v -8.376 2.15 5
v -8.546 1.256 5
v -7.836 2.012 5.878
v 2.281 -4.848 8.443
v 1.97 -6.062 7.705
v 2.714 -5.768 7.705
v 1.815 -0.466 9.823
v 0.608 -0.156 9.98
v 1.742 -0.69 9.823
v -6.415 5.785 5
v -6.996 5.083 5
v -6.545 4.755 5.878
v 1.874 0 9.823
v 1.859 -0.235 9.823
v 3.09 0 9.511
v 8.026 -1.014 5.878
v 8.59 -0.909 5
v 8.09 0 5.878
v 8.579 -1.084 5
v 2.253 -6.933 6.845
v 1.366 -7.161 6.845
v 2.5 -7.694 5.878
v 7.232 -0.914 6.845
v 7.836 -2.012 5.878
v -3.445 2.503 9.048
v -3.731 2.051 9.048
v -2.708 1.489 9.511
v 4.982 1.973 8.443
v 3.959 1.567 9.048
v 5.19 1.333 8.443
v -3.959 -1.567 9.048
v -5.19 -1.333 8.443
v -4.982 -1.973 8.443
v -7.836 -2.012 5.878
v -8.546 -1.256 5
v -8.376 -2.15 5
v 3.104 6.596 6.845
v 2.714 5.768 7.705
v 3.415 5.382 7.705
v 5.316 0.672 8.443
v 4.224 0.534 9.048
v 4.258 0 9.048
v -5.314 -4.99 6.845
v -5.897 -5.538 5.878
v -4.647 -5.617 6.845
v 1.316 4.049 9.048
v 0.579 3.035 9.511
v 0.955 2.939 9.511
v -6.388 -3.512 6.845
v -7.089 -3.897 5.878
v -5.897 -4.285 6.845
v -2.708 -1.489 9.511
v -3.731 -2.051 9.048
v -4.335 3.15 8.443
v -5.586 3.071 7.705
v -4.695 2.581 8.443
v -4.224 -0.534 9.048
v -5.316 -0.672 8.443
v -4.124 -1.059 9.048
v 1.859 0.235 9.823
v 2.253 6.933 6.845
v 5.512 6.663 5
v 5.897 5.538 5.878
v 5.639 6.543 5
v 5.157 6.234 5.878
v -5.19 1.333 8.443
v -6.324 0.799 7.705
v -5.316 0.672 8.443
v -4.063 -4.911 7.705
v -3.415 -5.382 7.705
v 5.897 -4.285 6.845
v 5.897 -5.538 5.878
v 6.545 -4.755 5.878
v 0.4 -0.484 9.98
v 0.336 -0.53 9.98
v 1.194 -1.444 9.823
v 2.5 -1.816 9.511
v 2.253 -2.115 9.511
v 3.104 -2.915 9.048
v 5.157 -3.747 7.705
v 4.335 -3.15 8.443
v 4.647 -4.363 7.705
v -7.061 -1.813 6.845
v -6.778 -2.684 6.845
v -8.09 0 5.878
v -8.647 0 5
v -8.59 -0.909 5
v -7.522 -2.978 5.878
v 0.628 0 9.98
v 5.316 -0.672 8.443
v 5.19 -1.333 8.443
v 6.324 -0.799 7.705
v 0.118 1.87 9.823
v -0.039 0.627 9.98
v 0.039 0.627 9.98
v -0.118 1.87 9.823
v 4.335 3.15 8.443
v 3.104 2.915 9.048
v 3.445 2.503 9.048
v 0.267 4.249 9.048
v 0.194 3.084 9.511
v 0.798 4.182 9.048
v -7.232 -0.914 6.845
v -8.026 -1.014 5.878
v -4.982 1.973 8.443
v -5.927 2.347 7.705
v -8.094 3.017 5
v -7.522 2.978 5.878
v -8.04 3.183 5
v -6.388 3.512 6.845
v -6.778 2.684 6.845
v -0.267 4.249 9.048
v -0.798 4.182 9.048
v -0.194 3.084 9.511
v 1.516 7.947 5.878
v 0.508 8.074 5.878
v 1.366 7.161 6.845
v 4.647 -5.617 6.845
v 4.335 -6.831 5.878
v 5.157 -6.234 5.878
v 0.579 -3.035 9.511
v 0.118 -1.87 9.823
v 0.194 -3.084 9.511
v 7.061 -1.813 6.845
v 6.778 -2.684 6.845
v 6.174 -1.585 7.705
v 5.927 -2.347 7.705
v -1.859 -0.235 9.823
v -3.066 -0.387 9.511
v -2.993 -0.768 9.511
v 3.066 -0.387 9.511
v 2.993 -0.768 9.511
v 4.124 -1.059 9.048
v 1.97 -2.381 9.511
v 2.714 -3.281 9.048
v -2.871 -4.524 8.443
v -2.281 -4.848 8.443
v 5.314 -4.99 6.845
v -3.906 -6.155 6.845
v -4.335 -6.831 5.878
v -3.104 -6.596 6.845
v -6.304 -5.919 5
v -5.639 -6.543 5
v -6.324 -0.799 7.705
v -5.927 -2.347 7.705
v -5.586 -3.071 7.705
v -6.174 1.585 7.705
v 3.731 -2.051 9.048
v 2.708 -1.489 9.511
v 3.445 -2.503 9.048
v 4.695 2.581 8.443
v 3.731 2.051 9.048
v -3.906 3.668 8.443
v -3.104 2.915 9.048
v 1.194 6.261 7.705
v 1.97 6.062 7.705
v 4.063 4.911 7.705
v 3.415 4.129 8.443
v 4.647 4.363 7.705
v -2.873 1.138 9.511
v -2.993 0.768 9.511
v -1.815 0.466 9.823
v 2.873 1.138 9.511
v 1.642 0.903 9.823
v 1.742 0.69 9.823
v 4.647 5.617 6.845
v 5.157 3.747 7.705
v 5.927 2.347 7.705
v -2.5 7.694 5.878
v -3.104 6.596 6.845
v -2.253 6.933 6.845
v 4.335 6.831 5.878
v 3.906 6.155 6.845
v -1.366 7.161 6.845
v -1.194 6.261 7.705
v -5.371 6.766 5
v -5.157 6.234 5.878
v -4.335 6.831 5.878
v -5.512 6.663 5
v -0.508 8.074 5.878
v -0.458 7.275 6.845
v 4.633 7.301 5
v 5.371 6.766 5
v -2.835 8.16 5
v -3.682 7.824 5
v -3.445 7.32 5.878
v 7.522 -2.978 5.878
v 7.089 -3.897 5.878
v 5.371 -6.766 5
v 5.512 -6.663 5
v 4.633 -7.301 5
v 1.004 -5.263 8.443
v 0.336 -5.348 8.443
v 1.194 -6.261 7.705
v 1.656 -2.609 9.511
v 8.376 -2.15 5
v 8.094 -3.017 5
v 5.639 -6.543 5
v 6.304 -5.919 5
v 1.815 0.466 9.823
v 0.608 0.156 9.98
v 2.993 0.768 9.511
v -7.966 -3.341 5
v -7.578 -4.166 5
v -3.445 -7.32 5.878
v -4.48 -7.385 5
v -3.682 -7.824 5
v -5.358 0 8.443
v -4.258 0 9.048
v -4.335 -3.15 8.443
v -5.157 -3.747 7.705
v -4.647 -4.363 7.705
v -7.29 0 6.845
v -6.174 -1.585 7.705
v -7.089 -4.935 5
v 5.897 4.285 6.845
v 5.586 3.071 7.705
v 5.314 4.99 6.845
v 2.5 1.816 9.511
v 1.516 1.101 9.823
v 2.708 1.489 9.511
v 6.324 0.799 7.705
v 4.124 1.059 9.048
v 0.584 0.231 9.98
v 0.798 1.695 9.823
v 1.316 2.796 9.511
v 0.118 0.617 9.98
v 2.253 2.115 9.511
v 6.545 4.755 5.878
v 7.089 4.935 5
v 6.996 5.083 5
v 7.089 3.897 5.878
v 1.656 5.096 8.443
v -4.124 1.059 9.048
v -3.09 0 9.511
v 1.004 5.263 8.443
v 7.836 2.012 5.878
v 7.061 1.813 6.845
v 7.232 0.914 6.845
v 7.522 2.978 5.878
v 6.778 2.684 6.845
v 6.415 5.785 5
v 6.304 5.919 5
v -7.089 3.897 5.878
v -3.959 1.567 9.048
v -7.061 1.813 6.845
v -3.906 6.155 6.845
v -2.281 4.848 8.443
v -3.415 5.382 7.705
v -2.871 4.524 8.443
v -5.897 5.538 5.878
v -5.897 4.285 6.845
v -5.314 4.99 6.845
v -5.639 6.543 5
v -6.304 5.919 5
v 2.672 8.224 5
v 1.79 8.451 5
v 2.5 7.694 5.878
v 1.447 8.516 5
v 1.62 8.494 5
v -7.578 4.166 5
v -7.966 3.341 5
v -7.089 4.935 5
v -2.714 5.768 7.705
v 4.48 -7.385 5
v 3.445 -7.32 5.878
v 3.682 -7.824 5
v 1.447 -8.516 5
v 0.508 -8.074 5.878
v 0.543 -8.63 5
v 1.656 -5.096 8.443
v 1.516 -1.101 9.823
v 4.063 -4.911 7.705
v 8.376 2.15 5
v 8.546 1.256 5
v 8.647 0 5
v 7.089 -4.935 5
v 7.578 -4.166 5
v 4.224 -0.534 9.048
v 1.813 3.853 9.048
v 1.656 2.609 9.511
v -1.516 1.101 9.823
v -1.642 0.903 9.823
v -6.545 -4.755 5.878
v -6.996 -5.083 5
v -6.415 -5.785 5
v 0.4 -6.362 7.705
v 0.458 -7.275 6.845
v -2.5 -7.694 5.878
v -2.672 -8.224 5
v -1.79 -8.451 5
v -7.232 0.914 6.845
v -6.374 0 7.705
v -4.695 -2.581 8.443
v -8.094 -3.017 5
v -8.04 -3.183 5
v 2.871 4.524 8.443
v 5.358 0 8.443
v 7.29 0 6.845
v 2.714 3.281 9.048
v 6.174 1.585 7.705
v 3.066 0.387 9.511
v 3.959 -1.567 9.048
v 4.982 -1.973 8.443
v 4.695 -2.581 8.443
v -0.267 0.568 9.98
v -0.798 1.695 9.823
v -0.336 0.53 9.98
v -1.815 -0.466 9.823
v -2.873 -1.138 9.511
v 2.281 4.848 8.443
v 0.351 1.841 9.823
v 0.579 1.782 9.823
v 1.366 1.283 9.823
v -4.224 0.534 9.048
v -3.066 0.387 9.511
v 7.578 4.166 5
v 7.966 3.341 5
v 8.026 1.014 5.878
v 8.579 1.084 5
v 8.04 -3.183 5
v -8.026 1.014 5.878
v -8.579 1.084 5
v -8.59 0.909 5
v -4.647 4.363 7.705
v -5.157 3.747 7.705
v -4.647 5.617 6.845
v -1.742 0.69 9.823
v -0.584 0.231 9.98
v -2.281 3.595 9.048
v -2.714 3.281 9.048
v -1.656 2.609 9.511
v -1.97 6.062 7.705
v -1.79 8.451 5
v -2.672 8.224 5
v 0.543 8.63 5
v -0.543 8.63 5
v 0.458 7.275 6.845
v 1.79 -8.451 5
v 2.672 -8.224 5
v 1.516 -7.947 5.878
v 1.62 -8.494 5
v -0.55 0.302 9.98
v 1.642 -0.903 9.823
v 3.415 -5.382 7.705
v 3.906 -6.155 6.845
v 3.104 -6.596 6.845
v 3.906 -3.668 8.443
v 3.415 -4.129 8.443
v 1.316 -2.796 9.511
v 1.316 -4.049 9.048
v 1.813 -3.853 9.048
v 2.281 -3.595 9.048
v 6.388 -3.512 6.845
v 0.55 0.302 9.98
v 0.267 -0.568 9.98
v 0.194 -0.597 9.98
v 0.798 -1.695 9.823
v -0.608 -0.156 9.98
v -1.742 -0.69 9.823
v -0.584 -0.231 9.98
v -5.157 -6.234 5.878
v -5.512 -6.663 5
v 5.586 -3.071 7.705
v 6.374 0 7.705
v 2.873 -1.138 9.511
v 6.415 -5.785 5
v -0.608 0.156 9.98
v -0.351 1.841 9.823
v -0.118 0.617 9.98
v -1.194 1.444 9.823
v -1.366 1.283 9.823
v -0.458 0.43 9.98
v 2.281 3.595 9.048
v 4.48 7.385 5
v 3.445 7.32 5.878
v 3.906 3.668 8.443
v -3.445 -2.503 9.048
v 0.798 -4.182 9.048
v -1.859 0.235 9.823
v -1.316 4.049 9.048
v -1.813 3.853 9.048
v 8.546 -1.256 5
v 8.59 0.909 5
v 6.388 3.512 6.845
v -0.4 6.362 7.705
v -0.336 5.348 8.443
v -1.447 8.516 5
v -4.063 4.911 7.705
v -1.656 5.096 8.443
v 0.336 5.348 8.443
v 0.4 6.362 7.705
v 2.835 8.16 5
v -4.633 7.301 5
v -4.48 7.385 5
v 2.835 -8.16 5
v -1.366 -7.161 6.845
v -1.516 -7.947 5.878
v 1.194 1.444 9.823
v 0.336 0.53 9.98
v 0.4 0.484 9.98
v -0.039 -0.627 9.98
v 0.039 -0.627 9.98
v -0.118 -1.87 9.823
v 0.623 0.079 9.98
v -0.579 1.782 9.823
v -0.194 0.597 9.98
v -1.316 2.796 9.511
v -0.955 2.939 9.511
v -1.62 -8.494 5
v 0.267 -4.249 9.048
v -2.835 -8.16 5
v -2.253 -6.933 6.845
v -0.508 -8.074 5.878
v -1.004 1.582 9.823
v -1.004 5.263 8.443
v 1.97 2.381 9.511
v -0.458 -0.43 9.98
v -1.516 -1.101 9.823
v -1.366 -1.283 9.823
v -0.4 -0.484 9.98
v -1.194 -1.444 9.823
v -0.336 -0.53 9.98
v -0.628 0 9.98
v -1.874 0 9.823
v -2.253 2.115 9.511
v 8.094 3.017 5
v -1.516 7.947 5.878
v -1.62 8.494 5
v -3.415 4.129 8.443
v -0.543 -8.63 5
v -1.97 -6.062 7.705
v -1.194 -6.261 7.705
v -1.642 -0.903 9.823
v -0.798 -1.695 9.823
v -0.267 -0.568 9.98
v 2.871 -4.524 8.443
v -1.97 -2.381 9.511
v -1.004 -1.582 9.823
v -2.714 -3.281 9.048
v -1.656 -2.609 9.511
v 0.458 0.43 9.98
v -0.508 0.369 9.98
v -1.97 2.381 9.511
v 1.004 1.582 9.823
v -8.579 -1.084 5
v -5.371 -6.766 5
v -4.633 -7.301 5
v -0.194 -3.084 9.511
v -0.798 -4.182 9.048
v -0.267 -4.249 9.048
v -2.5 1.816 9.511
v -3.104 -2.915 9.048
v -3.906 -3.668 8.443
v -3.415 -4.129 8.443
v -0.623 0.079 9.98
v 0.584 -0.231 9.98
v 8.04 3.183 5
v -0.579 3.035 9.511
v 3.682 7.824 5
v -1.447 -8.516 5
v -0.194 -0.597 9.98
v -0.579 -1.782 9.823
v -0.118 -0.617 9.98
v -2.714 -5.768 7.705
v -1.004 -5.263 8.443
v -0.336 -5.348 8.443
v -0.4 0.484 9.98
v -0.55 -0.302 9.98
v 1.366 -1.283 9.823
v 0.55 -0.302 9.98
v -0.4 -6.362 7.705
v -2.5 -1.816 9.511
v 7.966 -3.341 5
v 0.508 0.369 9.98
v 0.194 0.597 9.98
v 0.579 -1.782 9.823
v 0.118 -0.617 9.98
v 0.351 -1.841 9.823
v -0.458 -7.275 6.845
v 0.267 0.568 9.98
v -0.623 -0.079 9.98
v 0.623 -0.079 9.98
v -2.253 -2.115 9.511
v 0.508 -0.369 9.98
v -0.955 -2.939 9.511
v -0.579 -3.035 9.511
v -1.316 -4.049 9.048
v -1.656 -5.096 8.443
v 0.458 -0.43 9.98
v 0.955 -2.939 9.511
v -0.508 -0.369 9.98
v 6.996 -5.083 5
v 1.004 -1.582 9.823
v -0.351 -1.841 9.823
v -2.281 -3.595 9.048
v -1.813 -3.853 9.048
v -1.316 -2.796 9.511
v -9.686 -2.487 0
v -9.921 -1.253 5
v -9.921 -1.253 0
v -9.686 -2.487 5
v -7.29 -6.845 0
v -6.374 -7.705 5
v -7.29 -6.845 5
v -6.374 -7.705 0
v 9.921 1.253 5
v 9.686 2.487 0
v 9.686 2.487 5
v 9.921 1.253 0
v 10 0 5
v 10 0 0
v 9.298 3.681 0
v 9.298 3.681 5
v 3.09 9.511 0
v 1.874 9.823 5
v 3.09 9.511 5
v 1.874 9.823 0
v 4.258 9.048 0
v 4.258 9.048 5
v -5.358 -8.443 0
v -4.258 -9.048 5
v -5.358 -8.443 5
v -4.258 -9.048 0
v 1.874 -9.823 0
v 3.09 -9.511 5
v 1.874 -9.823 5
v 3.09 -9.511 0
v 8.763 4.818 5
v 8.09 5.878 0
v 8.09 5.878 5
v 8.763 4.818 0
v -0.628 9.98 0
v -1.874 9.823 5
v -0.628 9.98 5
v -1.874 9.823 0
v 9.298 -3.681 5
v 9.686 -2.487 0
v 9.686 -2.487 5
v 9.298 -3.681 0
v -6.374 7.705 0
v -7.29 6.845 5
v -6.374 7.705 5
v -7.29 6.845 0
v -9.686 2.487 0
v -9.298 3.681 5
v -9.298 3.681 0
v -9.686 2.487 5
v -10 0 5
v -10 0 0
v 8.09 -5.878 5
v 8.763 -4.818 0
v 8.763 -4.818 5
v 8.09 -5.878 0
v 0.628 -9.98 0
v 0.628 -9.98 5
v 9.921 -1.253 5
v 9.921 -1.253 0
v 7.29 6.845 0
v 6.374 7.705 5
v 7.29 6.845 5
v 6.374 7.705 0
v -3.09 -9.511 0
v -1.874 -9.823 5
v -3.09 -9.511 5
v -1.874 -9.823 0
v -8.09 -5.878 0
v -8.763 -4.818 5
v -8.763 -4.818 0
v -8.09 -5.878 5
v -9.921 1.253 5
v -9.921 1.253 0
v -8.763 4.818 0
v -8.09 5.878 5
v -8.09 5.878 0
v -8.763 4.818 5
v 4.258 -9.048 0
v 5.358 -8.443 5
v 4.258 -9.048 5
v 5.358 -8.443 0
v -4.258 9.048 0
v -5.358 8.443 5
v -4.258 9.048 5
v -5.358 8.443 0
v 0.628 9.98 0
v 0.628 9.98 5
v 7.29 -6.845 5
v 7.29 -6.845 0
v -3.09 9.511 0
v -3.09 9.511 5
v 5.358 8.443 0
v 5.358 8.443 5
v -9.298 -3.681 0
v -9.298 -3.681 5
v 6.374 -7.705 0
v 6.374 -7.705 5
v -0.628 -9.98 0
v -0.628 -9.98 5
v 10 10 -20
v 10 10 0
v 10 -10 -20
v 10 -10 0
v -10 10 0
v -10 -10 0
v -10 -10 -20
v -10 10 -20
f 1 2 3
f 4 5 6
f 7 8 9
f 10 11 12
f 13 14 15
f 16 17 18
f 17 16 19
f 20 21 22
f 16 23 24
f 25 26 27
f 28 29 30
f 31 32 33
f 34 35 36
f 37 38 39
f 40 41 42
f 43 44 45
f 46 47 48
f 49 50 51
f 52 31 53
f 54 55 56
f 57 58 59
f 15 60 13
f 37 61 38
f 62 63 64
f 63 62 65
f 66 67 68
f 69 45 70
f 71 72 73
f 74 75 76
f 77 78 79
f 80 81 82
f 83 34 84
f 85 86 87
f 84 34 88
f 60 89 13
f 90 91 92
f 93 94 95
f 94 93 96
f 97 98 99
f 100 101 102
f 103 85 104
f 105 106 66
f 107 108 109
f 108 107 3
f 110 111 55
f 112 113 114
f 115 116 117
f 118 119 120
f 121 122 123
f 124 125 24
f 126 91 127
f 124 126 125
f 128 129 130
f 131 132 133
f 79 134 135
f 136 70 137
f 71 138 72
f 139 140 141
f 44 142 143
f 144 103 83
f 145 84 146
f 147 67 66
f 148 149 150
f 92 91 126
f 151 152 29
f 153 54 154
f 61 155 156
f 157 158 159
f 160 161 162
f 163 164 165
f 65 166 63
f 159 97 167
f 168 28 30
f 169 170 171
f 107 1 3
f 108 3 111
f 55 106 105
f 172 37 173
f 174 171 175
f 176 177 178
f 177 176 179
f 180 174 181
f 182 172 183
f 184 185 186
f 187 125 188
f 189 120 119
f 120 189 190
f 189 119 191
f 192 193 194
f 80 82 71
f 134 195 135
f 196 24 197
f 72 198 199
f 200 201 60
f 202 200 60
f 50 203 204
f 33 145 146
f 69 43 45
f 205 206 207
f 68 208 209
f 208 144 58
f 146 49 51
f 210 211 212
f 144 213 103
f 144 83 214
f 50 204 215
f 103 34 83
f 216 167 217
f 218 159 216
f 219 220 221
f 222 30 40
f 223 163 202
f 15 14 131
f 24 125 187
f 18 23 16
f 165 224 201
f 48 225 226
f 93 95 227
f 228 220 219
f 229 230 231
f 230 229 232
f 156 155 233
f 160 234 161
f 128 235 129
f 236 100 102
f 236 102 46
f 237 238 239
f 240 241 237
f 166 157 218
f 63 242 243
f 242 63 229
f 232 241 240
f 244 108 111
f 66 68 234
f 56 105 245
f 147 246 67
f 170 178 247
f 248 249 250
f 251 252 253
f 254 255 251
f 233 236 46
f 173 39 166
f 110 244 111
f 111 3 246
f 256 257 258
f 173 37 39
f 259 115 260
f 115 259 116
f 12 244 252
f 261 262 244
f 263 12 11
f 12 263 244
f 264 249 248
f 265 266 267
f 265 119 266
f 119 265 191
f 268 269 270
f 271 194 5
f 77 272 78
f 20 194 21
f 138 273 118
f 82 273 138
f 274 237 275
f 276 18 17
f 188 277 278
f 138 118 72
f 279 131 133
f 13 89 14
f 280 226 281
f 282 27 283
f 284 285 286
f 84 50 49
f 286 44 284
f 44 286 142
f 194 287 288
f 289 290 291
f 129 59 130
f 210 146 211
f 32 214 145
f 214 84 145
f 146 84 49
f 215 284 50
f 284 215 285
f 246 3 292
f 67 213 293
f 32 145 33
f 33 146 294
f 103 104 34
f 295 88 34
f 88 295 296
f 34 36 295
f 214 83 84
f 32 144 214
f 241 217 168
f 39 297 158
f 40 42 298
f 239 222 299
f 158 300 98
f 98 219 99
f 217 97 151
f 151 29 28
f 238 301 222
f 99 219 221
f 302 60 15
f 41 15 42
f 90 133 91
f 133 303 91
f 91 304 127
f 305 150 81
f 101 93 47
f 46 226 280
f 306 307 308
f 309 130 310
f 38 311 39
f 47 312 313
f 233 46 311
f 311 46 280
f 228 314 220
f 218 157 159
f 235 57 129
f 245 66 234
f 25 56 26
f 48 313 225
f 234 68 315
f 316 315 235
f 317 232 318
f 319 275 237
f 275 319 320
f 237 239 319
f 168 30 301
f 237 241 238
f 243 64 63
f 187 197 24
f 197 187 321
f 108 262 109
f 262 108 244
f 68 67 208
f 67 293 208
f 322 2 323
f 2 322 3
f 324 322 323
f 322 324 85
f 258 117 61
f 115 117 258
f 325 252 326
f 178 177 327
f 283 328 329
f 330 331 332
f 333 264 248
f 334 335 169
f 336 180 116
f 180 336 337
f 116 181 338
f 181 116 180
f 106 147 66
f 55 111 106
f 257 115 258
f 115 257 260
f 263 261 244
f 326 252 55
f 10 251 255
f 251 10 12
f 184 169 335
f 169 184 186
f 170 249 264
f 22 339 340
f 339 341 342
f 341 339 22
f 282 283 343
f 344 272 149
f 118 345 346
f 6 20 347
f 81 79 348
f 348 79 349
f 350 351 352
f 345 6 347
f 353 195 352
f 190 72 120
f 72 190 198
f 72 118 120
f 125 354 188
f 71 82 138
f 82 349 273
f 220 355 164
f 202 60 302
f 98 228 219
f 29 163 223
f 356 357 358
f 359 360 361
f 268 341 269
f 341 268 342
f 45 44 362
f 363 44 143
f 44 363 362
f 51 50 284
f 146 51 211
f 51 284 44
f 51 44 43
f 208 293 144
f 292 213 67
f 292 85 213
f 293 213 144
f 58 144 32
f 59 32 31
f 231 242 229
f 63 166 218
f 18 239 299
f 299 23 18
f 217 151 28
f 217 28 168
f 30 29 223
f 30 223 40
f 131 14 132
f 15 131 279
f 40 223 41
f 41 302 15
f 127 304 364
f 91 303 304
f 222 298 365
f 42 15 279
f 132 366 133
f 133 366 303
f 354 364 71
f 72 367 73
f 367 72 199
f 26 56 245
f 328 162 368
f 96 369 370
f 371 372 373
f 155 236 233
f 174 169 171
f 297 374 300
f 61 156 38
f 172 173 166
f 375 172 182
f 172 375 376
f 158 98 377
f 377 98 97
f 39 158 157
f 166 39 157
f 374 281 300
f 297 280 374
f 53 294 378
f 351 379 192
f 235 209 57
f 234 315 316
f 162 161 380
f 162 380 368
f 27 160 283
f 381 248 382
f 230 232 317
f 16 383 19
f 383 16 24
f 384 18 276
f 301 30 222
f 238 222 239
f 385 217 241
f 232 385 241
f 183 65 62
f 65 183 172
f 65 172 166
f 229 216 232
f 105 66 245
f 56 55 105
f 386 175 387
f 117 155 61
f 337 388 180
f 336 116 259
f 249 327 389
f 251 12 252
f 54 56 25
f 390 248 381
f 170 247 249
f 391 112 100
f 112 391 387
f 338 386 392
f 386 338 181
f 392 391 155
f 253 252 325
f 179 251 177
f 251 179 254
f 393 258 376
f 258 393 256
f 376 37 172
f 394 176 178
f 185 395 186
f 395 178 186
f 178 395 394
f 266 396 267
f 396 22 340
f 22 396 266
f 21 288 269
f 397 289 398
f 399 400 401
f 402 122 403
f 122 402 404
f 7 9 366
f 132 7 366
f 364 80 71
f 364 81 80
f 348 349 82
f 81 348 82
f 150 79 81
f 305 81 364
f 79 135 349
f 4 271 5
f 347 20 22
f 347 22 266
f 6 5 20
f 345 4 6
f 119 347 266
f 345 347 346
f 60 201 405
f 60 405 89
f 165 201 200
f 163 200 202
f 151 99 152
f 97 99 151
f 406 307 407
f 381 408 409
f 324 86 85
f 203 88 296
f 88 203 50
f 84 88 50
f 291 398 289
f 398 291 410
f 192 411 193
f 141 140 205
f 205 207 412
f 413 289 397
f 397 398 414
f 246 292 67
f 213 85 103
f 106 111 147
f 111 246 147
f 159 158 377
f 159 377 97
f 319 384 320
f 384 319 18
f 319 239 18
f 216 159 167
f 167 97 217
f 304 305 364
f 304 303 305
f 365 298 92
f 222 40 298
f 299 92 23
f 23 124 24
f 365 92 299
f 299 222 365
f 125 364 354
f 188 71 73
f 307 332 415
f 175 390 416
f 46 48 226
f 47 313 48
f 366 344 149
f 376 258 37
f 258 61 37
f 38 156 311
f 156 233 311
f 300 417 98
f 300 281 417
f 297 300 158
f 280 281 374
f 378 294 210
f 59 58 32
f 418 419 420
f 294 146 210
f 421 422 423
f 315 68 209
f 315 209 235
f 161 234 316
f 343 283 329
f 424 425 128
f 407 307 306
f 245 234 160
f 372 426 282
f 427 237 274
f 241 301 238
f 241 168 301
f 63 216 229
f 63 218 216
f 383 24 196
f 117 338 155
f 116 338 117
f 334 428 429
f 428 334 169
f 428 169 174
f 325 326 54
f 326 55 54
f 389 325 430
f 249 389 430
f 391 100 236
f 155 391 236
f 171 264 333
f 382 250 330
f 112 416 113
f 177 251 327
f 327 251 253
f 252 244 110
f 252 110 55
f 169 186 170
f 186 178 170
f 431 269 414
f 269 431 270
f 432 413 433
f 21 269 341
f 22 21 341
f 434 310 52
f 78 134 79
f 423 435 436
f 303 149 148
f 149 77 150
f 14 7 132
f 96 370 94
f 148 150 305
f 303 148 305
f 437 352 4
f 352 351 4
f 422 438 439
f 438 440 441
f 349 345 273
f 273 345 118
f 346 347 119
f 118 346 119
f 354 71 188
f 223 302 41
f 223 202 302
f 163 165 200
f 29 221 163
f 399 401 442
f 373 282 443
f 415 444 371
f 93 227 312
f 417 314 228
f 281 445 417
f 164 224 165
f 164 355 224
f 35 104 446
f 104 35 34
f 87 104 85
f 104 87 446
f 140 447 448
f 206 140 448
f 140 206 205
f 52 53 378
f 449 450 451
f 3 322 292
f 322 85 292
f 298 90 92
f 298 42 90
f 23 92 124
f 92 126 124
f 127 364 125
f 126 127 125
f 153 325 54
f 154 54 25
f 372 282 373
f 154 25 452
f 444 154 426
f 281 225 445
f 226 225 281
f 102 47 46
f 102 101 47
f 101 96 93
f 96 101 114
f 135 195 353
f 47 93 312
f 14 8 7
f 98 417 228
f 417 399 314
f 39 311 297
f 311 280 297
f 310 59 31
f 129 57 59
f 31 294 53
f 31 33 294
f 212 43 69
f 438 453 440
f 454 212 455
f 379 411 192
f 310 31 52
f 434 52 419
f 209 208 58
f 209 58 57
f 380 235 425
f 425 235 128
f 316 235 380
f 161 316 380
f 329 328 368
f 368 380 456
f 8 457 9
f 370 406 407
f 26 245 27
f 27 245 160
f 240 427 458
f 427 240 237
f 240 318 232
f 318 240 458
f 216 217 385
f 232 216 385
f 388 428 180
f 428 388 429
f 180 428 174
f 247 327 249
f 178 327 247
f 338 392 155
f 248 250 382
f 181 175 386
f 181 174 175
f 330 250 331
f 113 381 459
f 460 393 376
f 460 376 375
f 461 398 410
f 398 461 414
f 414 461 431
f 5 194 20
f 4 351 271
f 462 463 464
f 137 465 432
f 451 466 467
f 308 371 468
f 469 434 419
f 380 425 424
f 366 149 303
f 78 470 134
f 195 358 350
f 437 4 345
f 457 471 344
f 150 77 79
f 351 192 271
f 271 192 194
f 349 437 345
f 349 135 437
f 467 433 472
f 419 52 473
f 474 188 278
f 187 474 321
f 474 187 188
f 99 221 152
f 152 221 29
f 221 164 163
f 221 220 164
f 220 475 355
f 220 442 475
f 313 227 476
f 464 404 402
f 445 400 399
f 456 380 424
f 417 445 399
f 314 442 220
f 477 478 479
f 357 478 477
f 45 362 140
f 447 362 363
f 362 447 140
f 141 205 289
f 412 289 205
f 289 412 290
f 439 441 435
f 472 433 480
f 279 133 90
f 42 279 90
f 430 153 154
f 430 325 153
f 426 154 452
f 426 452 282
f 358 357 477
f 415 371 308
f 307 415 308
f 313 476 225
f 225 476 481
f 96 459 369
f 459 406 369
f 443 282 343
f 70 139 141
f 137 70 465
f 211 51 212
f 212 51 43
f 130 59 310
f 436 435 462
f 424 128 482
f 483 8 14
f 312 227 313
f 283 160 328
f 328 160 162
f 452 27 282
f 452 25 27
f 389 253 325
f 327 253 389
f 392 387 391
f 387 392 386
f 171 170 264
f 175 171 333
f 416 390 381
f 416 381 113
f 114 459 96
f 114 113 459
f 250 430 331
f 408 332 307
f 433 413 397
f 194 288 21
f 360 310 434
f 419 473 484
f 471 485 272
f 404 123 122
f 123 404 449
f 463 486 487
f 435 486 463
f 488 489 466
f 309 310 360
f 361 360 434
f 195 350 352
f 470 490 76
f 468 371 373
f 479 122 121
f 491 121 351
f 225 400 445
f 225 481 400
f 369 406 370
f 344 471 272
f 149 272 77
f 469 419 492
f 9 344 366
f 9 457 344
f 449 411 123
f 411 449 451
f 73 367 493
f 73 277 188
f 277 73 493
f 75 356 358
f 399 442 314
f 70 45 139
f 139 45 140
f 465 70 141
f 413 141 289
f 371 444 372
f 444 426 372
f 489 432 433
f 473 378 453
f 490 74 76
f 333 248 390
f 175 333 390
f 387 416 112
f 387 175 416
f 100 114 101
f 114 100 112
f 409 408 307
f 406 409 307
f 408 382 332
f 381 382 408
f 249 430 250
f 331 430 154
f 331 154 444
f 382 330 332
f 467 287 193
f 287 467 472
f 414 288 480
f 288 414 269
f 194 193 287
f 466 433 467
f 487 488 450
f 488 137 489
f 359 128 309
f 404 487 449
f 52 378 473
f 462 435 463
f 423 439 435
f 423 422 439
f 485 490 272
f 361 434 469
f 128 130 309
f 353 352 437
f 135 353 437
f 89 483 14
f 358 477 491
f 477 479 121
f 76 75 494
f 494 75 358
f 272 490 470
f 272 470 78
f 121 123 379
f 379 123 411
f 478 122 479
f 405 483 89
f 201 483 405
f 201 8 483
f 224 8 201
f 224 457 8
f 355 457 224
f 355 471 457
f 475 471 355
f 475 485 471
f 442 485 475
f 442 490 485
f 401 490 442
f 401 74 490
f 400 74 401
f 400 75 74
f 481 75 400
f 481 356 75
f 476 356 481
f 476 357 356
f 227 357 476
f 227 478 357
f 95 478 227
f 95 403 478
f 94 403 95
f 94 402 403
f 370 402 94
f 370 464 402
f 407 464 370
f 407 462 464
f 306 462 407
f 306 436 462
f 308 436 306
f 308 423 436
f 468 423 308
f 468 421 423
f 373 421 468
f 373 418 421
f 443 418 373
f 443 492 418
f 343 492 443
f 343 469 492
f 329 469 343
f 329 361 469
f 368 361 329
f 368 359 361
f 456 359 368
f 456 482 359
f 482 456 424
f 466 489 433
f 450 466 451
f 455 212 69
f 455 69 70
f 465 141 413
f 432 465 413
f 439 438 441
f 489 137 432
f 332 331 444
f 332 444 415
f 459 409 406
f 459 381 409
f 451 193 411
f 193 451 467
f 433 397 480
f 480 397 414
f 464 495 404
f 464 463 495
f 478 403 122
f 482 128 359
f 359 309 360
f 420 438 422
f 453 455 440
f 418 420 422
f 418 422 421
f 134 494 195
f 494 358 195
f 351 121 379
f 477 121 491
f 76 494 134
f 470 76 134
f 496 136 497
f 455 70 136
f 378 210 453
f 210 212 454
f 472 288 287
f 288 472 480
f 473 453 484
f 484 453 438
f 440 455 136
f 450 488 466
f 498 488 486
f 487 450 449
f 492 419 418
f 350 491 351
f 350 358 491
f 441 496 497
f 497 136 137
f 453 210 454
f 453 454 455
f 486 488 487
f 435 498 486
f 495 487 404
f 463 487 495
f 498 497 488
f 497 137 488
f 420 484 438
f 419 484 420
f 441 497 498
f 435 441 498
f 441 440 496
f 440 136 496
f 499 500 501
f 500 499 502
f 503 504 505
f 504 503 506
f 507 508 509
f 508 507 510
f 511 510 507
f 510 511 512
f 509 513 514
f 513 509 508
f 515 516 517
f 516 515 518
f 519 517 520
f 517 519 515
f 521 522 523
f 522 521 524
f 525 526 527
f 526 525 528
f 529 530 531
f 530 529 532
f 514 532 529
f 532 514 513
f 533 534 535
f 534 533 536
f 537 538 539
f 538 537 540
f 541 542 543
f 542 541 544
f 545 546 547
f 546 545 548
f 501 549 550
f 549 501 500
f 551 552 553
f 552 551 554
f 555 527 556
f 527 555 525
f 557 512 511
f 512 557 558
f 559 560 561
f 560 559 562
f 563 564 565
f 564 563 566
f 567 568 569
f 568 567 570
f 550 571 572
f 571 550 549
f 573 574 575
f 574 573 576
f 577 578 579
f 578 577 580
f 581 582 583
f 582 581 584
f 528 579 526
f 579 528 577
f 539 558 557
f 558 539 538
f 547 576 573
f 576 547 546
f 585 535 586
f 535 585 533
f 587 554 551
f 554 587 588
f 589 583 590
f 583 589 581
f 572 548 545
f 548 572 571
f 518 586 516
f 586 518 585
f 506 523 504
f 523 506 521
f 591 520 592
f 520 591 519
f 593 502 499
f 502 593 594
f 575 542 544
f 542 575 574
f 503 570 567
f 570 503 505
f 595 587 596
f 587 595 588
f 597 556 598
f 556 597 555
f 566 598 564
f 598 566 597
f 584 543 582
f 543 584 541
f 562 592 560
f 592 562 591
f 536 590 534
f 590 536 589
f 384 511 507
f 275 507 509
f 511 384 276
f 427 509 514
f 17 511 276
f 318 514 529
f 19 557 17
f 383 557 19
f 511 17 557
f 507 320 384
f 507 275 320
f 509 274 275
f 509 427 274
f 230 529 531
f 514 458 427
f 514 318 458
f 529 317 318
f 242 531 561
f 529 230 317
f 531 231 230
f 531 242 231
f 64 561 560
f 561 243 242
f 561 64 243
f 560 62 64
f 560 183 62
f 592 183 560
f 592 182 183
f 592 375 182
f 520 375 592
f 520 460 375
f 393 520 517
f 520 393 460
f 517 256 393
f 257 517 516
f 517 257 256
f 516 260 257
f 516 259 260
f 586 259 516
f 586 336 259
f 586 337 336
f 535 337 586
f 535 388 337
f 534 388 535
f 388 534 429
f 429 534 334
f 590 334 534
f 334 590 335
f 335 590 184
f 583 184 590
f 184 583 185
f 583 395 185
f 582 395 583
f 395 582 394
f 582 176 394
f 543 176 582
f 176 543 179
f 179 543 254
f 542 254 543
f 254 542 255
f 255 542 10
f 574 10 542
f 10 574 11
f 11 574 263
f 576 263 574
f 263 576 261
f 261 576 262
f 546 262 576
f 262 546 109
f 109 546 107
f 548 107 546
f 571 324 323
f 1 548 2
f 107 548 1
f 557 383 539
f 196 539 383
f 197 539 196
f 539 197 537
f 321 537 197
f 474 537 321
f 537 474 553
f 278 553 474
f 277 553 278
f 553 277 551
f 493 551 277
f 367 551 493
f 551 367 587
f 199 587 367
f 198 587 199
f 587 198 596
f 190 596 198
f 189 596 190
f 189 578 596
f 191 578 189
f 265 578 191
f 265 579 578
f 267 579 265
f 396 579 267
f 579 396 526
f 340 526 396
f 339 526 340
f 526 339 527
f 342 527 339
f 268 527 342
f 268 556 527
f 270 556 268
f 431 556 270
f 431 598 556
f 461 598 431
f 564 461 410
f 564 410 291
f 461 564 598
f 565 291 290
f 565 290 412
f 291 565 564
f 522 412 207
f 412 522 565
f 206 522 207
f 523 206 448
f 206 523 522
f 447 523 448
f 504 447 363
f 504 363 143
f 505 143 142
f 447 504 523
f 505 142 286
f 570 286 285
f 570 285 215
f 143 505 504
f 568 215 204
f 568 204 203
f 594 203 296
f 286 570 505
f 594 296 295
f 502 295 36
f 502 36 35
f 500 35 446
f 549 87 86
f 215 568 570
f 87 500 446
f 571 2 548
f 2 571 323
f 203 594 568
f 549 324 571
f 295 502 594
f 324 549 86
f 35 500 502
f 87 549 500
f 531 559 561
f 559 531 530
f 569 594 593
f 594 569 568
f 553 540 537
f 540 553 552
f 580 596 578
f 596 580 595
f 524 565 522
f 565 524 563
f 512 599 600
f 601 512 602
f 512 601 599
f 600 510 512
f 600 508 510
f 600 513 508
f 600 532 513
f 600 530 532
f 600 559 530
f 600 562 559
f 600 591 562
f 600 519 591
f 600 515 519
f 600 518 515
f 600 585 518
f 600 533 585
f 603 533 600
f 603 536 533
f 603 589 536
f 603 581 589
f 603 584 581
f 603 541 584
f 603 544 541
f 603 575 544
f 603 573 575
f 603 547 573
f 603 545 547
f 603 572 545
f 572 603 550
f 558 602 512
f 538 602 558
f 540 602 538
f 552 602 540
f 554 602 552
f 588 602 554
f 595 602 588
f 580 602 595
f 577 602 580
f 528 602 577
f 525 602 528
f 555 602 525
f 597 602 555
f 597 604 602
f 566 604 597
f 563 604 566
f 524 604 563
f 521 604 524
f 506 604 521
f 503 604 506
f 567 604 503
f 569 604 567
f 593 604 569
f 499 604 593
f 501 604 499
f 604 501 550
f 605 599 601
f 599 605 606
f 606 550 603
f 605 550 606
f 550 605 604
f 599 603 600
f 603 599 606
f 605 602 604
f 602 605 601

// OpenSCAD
// Filename : Headlight.scad
// Version  : v1.0
// Modified : 2 Sept 2016
// Author   : Jason Yeo
//////////////////////////////////////
// Basic headlight
//////////////////////////////////////

$fn=50;

headlight();

module headlight(diameter=20)
{  
    //translate([0,0,-diameter/4])
    //difference()
    {
        union()
        {
            sphere(d=diameter,true);
            cylinder(diameter/2,diameter/2,diameter/2,true);
        }
        translate([0,0,-diameter/2])cube([diameter,diameter,diameter],true);
    }
}
